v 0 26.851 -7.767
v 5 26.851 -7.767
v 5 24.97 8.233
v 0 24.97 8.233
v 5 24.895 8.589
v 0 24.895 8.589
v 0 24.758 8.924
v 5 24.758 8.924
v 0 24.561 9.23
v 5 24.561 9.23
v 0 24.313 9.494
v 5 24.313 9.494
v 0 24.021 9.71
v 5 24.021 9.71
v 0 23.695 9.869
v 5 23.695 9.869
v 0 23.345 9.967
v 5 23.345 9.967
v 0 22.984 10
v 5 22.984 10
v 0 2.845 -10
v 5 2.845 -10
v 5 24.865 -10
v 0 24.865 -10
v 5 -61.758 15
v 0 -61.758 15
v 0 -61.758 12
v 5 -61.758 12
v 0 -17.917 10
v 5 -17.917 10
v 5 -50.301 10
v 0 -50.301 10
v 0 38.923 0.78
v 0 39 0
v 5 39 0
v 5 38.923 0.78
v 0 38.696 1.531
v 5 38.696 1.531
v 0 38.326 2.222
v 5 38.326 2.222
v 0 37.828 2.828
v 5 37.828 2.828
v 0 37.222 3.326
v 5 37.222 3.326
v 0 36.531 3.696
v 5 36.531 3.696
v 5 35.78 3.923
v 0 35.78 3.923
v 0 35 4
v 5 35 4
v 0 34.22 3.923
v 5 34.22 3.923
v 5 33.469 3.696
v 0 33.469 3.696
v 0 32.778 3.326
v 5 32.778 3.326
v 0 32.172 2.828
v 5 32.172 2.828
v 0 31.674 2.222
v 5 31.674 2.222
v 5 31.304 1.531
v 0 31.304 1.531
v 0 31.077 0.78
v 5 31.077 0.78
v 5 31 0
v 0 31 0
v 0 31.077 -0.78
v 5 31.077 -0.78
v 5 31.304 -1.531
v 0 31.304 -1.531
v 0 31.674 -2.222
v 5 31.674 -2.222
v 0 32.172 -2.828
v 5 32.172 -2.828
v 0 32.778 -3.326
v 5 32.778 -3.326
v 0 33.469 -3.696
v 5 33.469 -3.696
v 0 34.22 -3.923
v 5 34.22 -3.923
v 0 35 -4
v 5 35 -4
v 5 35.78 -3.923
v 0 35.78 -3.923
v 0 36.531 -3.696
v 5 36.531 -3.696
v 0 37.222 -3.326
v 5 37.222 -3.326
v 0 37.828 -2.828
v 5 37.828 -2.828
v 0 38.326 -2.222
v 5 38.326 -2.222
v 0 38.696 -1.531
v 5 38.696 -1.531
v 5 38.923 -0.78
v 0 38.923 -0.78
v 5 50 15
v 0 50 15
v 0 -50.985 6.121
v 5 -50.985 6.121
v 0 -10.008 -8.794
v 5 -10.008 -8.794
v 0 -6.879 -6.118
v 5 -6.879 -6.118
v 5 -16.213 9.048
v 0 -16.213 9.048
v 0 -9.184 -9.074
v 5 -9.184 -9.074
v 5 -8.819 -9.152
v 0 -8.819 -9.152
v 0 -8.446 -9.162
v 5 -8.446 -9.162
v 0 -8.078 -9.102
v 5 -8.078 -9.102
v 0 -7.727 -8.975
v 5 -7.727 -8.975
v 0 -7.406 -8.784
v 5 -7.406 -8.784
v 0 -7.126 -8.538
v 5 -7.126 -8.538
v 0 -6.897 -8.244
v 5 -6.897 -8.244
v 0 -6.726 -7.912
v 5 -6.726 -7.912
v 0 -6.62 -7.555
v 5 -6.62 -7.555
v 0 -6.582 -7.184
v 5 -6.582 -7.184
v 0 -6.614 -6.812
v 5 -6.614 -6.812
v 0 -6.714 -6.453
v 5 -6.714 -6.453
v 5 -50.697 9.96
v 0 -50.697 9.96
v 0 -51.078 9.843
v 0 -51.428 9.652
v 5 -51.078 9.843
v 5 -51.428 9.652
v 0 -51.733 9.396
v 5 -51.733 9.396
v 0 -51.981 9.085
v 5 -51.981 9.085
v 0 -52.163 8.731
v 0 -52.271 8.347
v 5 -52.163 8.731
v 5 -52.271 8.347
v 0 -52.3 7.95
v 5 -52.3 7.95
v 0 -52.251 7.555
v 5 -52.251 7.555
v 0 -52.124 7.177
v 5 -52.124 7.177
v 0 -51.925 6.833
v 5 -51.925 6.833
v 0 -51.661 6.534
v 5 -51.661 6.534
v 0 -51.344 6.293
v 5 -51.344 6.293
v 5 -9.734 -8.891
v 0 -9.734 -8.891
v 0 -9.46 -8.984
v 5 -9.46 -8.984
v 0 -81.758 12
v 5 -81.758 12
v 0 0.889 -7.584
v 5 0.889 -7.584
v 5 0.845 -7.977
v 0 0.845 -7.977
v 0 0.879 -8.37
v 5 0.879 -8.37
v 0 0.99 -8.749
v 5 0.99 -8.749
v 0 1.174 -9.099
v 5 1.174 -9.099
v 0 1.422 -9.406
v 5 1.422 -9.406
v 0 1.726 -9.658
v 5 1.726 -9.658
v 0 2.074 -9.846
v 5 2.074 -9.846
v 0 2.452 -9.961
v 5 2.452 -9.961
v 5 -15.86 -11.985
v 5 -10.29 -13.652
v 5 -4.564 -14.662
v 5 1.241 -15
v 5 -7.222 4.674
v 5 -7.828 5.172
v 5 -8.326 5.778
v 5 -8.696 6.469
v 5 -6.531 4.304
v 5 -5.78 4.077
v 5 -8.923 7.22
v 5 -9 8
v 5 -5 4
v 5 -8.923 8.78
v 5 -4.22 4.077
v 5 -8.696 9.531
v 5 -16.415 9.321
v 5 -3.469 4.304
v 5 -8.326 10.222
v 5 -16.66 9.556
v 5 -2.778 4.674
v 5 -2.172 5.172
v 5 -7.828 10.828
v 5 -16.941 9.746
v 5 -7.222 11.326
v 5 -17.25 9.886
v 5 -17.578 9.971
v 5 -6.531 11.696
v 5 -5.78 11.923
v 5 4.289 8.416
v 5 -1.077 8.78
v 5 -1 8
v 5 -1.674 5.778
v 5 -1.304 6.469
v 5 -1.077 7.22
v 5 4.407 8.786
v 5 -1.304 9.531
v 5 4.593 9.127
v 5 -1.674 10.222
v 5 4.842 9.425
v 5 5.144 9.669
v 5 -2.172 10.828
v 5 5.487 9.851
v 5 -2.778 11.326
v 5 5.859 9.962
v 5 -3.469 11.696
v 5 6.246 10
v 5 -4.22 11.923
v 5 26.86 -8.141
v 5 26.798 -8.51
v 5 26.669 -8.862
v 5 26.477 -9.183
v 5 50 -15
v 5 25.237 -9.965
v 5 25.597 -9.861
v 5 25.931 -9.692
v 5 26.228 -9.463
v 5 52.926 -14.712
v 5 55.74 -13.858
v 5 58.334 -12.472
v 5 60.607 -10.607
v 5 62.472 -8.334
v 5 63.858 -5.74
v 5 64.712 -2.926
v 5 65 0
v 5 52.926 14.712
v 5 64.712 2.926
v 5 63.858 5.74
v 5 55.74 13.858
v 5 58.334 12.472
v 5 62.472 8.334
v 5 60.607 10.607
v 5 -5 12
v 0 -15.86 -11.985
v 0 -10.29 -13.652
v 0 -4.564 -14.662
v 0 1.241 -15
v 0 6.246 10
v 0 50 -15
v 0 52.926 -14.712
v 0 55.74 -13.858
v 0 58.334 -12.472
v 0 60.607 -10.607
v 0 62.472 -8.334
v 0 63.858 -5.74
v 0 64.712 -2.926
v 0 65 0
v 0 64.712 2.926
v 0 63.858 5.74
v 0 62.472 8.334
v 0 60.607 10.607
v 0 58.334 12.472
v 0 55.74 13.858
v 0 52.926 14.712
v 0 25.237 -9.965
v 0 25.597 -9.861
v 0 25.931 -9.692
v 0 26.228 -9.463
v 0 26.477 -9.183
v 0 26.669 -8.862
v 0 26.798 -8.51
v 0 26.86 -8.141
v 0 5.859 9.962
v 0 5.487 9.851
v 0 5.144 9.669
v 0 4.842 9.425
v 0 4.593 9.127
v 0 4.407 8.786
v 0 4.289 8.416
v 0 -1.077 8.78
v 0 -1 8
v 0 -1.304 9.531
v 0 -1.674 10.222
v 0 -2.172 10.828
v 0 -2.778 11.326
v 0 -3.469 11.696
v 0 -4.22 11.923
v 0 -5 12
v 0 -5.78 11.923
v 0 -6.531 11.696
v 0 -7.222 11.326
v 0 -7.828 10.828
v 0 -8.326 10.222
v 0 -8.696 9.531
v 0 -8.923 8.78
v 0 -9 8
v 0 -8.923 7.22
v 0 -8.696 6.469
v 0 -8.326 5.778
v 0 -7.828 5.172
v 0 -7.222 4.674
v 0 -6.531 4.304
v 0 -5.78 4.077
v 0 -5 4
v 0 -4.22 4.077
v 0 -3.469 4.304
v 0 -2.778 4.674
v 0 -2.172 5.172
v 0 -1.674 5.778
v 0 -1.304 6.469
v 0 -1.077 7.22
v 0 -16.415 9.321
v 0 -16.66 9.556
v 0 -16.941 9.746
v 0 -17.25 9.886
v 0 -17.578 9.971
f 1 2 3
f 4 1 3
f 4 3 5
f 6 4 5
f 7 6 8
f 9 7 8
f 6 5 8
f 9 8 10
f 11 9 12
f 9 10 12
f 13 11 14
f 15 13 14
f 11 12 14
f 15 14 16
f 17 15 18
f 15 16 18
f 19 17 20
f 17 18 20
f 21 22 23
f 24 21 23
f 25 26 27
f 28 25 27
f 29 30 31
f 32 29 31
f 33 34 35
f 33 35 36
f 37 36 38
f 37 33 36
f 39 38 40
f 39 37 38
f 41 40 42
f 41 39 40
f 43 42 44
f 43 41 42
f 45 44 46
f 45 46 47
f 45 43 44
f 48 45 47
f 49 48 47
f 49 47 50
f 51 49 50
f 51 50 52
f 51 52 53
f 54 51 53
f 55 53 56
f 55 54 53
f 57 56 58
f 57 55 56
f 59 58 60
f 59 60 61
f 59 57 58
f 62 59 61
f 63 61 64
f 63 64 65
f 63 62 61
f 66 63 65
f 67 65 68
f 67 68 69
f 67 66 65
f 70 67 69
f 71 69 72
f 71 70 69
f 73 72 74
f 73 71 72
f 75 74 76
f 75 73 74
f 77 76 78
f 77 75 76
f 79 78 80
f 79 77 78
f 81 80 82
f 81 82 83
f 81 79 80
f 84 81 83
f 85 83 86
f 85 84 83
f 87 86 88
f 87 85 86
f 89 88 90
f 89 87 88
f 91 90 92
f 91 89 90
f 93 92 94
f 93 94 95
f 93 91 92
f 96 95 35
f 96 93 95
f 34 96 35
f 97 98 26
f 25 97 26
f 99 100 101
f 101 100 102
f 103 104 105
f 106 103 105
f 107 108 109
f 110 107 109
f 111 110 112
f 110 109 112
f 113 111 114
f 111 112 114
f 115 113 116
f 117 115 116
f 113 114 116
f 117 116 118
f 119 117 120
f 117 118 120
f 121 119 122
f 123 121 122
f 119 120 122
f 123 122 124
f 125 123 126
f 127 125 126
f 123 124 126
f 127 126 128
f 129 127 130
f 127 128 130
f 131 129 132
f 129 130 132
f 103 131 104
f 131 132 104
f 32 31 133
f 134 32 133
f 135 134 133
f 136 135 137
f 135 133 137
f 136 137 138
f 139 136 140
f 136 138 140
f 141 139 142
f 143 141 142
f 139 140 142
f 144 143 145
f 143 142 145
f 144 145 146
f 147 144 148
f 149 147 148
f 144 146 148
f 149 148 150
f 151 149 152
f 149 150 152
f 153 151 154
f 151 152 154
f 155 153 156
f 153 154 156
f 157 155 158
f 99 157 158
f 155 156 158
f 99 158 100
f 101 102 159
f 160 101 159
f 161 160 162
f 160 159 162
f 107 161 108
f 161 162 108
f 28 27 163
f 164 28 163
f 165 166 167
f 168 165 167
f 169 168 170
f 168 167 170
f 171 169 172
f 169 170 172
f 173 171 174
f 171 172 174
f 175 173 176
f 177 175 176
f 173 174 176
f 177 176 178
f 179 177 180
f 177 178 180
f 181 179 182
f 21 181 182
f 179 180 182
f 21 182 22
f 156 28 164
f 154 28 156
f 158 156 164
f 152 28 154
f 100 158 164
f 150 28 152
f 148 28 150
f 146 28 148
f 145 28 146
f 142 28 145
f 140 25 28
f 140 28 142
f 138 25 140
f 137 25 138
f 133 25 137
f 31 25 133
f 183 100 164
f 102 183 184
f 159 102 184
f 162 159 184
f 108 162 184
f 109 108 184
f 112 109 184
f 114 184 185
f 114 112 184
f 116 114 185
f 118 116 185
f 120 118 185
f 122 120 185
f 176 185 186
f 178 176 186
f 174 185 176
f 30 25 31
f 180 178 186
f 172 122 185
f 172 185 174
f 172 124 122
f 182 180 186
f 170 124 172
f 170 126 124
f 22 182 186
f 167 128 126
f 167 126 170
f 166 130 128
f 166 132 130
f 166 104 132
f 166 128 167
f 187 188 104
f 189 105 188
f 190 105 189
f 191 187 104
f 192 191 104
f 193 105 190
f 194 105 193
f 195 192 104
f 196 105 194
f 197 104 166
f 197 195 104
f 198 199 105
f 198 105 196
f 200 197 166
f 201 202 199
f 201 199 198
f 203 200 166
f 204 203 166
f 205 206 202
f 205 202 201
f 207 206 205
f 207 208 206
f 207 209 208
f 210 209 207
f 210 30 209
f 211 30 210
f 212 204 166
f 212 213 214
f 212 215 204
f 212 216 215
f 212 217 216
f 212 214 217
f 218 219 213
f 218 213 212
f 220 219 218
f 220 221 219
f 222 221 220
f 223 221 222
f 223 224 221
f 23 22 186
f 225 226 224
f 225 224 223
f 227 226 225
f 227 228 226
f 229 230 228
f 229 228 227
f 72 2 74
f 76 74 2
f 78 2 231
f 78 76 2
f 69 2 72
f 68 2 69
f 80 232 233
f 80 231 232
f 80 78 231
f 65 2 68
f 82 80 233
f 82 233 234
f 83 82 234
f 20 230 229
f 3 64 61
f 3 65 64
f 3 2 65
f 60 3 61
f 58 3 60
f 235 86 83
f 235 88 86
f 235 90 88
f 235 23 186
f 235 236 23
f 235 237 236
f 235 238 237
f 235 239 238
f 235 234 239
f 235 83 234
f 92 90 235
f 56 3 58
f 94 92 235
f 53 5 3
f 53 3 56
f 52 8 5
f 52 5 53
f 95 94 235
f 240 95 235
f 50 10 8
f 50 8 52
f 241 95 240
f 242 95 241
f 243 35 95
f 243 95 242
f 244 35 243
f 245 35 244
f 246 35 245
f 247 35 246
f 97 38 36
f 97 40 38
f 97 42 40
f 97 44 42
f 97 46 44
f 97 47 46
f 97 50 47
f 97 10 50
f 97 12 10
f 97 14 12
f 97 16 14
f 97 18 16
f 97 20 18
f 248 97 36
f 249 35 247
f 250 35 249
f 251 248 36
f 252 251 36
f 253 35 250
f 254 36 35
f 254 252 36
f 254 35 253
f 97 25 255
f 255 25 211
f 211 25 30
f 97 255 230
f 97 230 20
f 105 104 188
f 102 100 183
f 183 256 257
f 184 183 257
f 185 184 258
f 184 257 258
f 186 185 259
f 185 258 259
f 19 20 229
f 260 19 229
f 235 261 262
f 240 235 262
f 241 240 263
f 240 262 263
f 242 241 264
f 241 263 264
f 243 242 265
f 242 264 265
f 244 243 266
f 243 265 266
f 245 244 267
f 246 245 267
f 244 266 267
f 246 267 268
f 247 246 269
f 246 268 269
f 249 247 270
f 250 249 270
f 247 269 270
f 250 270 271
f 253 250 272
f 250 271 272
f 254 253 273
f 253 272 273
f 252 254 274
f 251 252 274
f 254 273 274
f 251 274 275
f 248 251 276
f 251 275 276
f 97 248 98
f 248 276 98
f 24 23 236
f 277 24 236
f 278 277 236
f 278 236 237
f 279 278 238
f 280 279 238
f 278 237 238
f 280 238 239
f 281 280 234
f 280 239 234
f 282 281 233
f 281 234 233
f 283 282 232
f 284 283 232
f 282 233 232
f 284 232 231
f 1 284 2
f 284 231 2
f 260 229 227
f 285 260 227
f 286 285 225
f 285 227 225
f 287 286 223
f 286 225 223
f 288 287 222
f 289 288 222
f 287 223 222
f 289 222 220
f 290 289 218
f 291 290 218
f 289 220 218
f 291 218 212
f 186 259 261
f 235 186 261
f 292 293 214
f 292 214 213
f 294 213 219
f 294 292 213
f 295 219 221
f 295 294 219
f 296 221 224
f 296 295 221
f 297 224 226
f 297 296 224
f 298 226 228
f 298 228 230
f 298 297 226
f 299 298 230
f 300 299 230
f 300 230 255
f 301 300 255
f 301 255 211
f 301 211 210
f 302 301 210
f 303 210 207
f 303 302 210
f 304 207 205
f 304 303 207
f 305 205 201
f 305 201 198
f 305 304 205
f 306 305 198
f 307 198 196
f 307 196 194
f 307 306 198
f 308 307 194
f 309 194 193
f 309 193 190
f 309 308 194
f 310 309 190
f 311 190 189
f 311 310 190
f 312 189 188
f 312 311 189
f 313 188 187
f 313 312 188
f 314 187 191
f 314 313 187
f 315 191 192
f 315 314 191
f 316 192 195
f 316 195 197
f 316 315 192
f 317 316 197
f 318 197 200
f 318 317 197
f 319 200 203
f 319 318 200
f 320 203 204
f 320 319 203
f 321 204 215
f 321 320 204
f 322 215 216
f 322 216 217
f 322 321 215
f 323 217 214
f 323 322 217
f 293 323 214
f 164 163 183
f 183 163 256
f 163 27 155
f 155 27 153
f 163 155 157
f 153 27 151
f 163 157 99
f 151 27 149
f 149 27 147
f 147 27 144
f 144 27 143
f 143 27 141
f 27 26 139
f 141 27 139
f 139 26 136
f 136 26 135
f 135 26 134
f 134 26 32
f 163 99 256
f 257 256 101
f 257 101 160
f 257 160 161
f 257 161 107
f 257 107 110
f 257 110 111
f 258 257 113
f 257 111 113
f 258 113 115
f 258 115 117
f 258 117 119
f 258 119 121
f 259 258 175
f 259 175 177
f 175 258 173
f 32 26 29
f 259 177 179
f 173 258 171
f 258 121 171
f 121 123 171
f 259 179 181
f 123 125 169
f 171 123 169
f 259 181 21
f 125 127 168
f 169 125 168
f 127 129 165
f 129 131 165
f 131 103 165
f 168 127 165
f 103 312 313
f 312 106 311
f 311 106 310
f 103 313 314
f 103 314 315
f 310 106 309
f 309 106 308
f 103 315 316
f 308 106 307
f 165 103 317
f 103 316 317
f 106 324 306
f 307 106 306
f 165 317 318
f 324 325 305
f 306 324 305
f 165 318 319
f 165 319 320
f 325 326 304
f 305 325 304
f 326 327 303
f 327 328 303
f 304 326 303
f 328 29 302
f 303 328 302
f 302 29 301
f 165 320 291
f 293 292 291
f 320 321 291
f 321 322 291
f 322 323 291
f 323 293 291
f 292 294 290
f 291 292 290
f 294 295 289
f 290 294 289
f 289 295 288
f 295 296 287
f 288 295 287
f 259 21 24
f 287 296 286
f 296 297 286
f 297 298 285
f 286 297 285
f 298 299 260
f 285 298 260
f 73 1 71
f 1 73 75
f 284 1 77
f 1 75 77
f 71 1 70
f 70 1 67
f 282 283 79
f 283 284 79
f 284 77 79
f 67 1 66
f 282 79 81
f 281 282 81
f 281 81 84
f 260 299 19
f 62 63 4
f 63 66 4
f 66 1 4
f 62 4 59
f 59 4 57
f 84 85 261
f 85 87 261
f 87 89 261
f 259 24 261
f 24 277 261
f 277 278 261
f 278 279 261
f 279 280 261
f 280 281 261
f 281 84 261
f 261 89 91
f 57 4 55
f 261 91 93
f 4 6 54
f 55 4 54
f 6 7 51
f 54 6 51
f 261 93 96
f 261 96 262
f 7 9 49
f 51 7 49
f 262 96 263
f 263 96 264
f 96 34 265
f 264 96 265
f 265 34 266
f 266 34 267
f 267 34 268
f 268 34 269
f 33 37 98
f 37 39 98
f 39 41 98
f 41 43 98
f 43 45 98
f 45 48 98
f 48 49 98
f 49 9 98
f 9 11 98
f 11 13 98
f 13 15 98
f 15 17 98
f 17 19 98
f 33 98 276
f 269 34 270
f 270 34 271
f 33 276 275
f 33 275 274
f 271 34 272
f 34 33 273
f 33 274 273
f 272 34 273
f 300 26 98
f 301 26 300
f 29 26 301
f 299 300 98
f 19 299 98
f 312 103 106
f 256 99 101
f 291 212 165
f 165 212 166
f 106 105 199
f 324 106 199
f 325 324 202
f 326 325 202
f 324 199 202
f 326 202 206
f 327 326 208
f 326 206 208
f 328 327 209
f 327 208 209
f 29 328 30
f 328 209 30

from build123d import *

# Parameters (mm, degrees)
F0_R     = 4
F1_DEPTH = 5
F3_DEPTH = 25


with BuildPart() as f1:
    # F0 (on Right) → F1 (new body)
    with BuildSketch(Plane.YZ):
        with BuildLine():
            Line((50, 15), (-61.757568, 15))
            Line((-61.757568, 15), (-61.757568, 12))
            Line((-61.757568, 12), (-81.757568, 12))
            Line((-81.757568, 12), (-15.860336, -11.984631))
            ThreePointArc((-15.860336, -11.984631), (-7.441737, -14.240388), (1.240672, -15))
            Line((1.240672, -15), (50, -15))
            ThreePointArc((50, -15), (65, 0), (50, 15))
        make_face()
        with Locations((35, 0)):
            Circle(F0_R, mode=Mode.SUBTRACT)
        with Locations((-5, 8)):
            Circle(F0_R, mode=Mode.SUBTRACT)
    extrude(amount=F1_DEPTH)

    # F2 (on face) → F3 (cut)
    with BuildSketch(Plane.YZ.offset(5)):
        with BuildLine():
            Line((-17.916537, 10), (-50.301027, 10))
            ThreePointArc((-50.301027, 10), (-52.270643, 8.347296), (-50.985068, 6.120615))
            Line((-50.985068, 6.120615), (-10.007906, -8.793852))
            ThreePointArc((-10.007906, -8.793852), (-9.597236, -8.938282), (-9.183521, -9.073739))
            ThreePointArc((-9.183521, -9.073739), (-7.004761, -8.396232), (-6.878676, -6.118051))
            Line((-6.878676, -6.118051), (-16.213294, 9.048315))
            ThreePointArc((-16.213294, 9.048315), (-16.940993, 9.745942), (-17.916537, 10))
        make_face()
        with BuildLine():
            Line((22.983953, 10), (6.245747, 10))
            ThreePointArc((6.245747, 10), (4.987106, 9.554292), (4.289451, 8.415823))
            Line((4.289451, 8.415823), (0.888546, -7.584177))
            ThreePointArc((0.888546, -7.584177), (1.29055, -9.258641), (2.844842, -10))
            Line((2.844842, -10), (24.864596, -10))
            ThreePointArc((24.864596, -10), (26.359077, -9.329108), (26.850922, -7.766527))
            Line((26.850922, -7.766527), (24.970279, 8.233473))
            ThreePointArc((24.970279, 8.233473), (24.31306, 9.494481), (22.983953, 10))
        make_face()
    extrude(amount=-F3_DEPTH, mode=Mode.SUBTRACT)


solid = f1.part
